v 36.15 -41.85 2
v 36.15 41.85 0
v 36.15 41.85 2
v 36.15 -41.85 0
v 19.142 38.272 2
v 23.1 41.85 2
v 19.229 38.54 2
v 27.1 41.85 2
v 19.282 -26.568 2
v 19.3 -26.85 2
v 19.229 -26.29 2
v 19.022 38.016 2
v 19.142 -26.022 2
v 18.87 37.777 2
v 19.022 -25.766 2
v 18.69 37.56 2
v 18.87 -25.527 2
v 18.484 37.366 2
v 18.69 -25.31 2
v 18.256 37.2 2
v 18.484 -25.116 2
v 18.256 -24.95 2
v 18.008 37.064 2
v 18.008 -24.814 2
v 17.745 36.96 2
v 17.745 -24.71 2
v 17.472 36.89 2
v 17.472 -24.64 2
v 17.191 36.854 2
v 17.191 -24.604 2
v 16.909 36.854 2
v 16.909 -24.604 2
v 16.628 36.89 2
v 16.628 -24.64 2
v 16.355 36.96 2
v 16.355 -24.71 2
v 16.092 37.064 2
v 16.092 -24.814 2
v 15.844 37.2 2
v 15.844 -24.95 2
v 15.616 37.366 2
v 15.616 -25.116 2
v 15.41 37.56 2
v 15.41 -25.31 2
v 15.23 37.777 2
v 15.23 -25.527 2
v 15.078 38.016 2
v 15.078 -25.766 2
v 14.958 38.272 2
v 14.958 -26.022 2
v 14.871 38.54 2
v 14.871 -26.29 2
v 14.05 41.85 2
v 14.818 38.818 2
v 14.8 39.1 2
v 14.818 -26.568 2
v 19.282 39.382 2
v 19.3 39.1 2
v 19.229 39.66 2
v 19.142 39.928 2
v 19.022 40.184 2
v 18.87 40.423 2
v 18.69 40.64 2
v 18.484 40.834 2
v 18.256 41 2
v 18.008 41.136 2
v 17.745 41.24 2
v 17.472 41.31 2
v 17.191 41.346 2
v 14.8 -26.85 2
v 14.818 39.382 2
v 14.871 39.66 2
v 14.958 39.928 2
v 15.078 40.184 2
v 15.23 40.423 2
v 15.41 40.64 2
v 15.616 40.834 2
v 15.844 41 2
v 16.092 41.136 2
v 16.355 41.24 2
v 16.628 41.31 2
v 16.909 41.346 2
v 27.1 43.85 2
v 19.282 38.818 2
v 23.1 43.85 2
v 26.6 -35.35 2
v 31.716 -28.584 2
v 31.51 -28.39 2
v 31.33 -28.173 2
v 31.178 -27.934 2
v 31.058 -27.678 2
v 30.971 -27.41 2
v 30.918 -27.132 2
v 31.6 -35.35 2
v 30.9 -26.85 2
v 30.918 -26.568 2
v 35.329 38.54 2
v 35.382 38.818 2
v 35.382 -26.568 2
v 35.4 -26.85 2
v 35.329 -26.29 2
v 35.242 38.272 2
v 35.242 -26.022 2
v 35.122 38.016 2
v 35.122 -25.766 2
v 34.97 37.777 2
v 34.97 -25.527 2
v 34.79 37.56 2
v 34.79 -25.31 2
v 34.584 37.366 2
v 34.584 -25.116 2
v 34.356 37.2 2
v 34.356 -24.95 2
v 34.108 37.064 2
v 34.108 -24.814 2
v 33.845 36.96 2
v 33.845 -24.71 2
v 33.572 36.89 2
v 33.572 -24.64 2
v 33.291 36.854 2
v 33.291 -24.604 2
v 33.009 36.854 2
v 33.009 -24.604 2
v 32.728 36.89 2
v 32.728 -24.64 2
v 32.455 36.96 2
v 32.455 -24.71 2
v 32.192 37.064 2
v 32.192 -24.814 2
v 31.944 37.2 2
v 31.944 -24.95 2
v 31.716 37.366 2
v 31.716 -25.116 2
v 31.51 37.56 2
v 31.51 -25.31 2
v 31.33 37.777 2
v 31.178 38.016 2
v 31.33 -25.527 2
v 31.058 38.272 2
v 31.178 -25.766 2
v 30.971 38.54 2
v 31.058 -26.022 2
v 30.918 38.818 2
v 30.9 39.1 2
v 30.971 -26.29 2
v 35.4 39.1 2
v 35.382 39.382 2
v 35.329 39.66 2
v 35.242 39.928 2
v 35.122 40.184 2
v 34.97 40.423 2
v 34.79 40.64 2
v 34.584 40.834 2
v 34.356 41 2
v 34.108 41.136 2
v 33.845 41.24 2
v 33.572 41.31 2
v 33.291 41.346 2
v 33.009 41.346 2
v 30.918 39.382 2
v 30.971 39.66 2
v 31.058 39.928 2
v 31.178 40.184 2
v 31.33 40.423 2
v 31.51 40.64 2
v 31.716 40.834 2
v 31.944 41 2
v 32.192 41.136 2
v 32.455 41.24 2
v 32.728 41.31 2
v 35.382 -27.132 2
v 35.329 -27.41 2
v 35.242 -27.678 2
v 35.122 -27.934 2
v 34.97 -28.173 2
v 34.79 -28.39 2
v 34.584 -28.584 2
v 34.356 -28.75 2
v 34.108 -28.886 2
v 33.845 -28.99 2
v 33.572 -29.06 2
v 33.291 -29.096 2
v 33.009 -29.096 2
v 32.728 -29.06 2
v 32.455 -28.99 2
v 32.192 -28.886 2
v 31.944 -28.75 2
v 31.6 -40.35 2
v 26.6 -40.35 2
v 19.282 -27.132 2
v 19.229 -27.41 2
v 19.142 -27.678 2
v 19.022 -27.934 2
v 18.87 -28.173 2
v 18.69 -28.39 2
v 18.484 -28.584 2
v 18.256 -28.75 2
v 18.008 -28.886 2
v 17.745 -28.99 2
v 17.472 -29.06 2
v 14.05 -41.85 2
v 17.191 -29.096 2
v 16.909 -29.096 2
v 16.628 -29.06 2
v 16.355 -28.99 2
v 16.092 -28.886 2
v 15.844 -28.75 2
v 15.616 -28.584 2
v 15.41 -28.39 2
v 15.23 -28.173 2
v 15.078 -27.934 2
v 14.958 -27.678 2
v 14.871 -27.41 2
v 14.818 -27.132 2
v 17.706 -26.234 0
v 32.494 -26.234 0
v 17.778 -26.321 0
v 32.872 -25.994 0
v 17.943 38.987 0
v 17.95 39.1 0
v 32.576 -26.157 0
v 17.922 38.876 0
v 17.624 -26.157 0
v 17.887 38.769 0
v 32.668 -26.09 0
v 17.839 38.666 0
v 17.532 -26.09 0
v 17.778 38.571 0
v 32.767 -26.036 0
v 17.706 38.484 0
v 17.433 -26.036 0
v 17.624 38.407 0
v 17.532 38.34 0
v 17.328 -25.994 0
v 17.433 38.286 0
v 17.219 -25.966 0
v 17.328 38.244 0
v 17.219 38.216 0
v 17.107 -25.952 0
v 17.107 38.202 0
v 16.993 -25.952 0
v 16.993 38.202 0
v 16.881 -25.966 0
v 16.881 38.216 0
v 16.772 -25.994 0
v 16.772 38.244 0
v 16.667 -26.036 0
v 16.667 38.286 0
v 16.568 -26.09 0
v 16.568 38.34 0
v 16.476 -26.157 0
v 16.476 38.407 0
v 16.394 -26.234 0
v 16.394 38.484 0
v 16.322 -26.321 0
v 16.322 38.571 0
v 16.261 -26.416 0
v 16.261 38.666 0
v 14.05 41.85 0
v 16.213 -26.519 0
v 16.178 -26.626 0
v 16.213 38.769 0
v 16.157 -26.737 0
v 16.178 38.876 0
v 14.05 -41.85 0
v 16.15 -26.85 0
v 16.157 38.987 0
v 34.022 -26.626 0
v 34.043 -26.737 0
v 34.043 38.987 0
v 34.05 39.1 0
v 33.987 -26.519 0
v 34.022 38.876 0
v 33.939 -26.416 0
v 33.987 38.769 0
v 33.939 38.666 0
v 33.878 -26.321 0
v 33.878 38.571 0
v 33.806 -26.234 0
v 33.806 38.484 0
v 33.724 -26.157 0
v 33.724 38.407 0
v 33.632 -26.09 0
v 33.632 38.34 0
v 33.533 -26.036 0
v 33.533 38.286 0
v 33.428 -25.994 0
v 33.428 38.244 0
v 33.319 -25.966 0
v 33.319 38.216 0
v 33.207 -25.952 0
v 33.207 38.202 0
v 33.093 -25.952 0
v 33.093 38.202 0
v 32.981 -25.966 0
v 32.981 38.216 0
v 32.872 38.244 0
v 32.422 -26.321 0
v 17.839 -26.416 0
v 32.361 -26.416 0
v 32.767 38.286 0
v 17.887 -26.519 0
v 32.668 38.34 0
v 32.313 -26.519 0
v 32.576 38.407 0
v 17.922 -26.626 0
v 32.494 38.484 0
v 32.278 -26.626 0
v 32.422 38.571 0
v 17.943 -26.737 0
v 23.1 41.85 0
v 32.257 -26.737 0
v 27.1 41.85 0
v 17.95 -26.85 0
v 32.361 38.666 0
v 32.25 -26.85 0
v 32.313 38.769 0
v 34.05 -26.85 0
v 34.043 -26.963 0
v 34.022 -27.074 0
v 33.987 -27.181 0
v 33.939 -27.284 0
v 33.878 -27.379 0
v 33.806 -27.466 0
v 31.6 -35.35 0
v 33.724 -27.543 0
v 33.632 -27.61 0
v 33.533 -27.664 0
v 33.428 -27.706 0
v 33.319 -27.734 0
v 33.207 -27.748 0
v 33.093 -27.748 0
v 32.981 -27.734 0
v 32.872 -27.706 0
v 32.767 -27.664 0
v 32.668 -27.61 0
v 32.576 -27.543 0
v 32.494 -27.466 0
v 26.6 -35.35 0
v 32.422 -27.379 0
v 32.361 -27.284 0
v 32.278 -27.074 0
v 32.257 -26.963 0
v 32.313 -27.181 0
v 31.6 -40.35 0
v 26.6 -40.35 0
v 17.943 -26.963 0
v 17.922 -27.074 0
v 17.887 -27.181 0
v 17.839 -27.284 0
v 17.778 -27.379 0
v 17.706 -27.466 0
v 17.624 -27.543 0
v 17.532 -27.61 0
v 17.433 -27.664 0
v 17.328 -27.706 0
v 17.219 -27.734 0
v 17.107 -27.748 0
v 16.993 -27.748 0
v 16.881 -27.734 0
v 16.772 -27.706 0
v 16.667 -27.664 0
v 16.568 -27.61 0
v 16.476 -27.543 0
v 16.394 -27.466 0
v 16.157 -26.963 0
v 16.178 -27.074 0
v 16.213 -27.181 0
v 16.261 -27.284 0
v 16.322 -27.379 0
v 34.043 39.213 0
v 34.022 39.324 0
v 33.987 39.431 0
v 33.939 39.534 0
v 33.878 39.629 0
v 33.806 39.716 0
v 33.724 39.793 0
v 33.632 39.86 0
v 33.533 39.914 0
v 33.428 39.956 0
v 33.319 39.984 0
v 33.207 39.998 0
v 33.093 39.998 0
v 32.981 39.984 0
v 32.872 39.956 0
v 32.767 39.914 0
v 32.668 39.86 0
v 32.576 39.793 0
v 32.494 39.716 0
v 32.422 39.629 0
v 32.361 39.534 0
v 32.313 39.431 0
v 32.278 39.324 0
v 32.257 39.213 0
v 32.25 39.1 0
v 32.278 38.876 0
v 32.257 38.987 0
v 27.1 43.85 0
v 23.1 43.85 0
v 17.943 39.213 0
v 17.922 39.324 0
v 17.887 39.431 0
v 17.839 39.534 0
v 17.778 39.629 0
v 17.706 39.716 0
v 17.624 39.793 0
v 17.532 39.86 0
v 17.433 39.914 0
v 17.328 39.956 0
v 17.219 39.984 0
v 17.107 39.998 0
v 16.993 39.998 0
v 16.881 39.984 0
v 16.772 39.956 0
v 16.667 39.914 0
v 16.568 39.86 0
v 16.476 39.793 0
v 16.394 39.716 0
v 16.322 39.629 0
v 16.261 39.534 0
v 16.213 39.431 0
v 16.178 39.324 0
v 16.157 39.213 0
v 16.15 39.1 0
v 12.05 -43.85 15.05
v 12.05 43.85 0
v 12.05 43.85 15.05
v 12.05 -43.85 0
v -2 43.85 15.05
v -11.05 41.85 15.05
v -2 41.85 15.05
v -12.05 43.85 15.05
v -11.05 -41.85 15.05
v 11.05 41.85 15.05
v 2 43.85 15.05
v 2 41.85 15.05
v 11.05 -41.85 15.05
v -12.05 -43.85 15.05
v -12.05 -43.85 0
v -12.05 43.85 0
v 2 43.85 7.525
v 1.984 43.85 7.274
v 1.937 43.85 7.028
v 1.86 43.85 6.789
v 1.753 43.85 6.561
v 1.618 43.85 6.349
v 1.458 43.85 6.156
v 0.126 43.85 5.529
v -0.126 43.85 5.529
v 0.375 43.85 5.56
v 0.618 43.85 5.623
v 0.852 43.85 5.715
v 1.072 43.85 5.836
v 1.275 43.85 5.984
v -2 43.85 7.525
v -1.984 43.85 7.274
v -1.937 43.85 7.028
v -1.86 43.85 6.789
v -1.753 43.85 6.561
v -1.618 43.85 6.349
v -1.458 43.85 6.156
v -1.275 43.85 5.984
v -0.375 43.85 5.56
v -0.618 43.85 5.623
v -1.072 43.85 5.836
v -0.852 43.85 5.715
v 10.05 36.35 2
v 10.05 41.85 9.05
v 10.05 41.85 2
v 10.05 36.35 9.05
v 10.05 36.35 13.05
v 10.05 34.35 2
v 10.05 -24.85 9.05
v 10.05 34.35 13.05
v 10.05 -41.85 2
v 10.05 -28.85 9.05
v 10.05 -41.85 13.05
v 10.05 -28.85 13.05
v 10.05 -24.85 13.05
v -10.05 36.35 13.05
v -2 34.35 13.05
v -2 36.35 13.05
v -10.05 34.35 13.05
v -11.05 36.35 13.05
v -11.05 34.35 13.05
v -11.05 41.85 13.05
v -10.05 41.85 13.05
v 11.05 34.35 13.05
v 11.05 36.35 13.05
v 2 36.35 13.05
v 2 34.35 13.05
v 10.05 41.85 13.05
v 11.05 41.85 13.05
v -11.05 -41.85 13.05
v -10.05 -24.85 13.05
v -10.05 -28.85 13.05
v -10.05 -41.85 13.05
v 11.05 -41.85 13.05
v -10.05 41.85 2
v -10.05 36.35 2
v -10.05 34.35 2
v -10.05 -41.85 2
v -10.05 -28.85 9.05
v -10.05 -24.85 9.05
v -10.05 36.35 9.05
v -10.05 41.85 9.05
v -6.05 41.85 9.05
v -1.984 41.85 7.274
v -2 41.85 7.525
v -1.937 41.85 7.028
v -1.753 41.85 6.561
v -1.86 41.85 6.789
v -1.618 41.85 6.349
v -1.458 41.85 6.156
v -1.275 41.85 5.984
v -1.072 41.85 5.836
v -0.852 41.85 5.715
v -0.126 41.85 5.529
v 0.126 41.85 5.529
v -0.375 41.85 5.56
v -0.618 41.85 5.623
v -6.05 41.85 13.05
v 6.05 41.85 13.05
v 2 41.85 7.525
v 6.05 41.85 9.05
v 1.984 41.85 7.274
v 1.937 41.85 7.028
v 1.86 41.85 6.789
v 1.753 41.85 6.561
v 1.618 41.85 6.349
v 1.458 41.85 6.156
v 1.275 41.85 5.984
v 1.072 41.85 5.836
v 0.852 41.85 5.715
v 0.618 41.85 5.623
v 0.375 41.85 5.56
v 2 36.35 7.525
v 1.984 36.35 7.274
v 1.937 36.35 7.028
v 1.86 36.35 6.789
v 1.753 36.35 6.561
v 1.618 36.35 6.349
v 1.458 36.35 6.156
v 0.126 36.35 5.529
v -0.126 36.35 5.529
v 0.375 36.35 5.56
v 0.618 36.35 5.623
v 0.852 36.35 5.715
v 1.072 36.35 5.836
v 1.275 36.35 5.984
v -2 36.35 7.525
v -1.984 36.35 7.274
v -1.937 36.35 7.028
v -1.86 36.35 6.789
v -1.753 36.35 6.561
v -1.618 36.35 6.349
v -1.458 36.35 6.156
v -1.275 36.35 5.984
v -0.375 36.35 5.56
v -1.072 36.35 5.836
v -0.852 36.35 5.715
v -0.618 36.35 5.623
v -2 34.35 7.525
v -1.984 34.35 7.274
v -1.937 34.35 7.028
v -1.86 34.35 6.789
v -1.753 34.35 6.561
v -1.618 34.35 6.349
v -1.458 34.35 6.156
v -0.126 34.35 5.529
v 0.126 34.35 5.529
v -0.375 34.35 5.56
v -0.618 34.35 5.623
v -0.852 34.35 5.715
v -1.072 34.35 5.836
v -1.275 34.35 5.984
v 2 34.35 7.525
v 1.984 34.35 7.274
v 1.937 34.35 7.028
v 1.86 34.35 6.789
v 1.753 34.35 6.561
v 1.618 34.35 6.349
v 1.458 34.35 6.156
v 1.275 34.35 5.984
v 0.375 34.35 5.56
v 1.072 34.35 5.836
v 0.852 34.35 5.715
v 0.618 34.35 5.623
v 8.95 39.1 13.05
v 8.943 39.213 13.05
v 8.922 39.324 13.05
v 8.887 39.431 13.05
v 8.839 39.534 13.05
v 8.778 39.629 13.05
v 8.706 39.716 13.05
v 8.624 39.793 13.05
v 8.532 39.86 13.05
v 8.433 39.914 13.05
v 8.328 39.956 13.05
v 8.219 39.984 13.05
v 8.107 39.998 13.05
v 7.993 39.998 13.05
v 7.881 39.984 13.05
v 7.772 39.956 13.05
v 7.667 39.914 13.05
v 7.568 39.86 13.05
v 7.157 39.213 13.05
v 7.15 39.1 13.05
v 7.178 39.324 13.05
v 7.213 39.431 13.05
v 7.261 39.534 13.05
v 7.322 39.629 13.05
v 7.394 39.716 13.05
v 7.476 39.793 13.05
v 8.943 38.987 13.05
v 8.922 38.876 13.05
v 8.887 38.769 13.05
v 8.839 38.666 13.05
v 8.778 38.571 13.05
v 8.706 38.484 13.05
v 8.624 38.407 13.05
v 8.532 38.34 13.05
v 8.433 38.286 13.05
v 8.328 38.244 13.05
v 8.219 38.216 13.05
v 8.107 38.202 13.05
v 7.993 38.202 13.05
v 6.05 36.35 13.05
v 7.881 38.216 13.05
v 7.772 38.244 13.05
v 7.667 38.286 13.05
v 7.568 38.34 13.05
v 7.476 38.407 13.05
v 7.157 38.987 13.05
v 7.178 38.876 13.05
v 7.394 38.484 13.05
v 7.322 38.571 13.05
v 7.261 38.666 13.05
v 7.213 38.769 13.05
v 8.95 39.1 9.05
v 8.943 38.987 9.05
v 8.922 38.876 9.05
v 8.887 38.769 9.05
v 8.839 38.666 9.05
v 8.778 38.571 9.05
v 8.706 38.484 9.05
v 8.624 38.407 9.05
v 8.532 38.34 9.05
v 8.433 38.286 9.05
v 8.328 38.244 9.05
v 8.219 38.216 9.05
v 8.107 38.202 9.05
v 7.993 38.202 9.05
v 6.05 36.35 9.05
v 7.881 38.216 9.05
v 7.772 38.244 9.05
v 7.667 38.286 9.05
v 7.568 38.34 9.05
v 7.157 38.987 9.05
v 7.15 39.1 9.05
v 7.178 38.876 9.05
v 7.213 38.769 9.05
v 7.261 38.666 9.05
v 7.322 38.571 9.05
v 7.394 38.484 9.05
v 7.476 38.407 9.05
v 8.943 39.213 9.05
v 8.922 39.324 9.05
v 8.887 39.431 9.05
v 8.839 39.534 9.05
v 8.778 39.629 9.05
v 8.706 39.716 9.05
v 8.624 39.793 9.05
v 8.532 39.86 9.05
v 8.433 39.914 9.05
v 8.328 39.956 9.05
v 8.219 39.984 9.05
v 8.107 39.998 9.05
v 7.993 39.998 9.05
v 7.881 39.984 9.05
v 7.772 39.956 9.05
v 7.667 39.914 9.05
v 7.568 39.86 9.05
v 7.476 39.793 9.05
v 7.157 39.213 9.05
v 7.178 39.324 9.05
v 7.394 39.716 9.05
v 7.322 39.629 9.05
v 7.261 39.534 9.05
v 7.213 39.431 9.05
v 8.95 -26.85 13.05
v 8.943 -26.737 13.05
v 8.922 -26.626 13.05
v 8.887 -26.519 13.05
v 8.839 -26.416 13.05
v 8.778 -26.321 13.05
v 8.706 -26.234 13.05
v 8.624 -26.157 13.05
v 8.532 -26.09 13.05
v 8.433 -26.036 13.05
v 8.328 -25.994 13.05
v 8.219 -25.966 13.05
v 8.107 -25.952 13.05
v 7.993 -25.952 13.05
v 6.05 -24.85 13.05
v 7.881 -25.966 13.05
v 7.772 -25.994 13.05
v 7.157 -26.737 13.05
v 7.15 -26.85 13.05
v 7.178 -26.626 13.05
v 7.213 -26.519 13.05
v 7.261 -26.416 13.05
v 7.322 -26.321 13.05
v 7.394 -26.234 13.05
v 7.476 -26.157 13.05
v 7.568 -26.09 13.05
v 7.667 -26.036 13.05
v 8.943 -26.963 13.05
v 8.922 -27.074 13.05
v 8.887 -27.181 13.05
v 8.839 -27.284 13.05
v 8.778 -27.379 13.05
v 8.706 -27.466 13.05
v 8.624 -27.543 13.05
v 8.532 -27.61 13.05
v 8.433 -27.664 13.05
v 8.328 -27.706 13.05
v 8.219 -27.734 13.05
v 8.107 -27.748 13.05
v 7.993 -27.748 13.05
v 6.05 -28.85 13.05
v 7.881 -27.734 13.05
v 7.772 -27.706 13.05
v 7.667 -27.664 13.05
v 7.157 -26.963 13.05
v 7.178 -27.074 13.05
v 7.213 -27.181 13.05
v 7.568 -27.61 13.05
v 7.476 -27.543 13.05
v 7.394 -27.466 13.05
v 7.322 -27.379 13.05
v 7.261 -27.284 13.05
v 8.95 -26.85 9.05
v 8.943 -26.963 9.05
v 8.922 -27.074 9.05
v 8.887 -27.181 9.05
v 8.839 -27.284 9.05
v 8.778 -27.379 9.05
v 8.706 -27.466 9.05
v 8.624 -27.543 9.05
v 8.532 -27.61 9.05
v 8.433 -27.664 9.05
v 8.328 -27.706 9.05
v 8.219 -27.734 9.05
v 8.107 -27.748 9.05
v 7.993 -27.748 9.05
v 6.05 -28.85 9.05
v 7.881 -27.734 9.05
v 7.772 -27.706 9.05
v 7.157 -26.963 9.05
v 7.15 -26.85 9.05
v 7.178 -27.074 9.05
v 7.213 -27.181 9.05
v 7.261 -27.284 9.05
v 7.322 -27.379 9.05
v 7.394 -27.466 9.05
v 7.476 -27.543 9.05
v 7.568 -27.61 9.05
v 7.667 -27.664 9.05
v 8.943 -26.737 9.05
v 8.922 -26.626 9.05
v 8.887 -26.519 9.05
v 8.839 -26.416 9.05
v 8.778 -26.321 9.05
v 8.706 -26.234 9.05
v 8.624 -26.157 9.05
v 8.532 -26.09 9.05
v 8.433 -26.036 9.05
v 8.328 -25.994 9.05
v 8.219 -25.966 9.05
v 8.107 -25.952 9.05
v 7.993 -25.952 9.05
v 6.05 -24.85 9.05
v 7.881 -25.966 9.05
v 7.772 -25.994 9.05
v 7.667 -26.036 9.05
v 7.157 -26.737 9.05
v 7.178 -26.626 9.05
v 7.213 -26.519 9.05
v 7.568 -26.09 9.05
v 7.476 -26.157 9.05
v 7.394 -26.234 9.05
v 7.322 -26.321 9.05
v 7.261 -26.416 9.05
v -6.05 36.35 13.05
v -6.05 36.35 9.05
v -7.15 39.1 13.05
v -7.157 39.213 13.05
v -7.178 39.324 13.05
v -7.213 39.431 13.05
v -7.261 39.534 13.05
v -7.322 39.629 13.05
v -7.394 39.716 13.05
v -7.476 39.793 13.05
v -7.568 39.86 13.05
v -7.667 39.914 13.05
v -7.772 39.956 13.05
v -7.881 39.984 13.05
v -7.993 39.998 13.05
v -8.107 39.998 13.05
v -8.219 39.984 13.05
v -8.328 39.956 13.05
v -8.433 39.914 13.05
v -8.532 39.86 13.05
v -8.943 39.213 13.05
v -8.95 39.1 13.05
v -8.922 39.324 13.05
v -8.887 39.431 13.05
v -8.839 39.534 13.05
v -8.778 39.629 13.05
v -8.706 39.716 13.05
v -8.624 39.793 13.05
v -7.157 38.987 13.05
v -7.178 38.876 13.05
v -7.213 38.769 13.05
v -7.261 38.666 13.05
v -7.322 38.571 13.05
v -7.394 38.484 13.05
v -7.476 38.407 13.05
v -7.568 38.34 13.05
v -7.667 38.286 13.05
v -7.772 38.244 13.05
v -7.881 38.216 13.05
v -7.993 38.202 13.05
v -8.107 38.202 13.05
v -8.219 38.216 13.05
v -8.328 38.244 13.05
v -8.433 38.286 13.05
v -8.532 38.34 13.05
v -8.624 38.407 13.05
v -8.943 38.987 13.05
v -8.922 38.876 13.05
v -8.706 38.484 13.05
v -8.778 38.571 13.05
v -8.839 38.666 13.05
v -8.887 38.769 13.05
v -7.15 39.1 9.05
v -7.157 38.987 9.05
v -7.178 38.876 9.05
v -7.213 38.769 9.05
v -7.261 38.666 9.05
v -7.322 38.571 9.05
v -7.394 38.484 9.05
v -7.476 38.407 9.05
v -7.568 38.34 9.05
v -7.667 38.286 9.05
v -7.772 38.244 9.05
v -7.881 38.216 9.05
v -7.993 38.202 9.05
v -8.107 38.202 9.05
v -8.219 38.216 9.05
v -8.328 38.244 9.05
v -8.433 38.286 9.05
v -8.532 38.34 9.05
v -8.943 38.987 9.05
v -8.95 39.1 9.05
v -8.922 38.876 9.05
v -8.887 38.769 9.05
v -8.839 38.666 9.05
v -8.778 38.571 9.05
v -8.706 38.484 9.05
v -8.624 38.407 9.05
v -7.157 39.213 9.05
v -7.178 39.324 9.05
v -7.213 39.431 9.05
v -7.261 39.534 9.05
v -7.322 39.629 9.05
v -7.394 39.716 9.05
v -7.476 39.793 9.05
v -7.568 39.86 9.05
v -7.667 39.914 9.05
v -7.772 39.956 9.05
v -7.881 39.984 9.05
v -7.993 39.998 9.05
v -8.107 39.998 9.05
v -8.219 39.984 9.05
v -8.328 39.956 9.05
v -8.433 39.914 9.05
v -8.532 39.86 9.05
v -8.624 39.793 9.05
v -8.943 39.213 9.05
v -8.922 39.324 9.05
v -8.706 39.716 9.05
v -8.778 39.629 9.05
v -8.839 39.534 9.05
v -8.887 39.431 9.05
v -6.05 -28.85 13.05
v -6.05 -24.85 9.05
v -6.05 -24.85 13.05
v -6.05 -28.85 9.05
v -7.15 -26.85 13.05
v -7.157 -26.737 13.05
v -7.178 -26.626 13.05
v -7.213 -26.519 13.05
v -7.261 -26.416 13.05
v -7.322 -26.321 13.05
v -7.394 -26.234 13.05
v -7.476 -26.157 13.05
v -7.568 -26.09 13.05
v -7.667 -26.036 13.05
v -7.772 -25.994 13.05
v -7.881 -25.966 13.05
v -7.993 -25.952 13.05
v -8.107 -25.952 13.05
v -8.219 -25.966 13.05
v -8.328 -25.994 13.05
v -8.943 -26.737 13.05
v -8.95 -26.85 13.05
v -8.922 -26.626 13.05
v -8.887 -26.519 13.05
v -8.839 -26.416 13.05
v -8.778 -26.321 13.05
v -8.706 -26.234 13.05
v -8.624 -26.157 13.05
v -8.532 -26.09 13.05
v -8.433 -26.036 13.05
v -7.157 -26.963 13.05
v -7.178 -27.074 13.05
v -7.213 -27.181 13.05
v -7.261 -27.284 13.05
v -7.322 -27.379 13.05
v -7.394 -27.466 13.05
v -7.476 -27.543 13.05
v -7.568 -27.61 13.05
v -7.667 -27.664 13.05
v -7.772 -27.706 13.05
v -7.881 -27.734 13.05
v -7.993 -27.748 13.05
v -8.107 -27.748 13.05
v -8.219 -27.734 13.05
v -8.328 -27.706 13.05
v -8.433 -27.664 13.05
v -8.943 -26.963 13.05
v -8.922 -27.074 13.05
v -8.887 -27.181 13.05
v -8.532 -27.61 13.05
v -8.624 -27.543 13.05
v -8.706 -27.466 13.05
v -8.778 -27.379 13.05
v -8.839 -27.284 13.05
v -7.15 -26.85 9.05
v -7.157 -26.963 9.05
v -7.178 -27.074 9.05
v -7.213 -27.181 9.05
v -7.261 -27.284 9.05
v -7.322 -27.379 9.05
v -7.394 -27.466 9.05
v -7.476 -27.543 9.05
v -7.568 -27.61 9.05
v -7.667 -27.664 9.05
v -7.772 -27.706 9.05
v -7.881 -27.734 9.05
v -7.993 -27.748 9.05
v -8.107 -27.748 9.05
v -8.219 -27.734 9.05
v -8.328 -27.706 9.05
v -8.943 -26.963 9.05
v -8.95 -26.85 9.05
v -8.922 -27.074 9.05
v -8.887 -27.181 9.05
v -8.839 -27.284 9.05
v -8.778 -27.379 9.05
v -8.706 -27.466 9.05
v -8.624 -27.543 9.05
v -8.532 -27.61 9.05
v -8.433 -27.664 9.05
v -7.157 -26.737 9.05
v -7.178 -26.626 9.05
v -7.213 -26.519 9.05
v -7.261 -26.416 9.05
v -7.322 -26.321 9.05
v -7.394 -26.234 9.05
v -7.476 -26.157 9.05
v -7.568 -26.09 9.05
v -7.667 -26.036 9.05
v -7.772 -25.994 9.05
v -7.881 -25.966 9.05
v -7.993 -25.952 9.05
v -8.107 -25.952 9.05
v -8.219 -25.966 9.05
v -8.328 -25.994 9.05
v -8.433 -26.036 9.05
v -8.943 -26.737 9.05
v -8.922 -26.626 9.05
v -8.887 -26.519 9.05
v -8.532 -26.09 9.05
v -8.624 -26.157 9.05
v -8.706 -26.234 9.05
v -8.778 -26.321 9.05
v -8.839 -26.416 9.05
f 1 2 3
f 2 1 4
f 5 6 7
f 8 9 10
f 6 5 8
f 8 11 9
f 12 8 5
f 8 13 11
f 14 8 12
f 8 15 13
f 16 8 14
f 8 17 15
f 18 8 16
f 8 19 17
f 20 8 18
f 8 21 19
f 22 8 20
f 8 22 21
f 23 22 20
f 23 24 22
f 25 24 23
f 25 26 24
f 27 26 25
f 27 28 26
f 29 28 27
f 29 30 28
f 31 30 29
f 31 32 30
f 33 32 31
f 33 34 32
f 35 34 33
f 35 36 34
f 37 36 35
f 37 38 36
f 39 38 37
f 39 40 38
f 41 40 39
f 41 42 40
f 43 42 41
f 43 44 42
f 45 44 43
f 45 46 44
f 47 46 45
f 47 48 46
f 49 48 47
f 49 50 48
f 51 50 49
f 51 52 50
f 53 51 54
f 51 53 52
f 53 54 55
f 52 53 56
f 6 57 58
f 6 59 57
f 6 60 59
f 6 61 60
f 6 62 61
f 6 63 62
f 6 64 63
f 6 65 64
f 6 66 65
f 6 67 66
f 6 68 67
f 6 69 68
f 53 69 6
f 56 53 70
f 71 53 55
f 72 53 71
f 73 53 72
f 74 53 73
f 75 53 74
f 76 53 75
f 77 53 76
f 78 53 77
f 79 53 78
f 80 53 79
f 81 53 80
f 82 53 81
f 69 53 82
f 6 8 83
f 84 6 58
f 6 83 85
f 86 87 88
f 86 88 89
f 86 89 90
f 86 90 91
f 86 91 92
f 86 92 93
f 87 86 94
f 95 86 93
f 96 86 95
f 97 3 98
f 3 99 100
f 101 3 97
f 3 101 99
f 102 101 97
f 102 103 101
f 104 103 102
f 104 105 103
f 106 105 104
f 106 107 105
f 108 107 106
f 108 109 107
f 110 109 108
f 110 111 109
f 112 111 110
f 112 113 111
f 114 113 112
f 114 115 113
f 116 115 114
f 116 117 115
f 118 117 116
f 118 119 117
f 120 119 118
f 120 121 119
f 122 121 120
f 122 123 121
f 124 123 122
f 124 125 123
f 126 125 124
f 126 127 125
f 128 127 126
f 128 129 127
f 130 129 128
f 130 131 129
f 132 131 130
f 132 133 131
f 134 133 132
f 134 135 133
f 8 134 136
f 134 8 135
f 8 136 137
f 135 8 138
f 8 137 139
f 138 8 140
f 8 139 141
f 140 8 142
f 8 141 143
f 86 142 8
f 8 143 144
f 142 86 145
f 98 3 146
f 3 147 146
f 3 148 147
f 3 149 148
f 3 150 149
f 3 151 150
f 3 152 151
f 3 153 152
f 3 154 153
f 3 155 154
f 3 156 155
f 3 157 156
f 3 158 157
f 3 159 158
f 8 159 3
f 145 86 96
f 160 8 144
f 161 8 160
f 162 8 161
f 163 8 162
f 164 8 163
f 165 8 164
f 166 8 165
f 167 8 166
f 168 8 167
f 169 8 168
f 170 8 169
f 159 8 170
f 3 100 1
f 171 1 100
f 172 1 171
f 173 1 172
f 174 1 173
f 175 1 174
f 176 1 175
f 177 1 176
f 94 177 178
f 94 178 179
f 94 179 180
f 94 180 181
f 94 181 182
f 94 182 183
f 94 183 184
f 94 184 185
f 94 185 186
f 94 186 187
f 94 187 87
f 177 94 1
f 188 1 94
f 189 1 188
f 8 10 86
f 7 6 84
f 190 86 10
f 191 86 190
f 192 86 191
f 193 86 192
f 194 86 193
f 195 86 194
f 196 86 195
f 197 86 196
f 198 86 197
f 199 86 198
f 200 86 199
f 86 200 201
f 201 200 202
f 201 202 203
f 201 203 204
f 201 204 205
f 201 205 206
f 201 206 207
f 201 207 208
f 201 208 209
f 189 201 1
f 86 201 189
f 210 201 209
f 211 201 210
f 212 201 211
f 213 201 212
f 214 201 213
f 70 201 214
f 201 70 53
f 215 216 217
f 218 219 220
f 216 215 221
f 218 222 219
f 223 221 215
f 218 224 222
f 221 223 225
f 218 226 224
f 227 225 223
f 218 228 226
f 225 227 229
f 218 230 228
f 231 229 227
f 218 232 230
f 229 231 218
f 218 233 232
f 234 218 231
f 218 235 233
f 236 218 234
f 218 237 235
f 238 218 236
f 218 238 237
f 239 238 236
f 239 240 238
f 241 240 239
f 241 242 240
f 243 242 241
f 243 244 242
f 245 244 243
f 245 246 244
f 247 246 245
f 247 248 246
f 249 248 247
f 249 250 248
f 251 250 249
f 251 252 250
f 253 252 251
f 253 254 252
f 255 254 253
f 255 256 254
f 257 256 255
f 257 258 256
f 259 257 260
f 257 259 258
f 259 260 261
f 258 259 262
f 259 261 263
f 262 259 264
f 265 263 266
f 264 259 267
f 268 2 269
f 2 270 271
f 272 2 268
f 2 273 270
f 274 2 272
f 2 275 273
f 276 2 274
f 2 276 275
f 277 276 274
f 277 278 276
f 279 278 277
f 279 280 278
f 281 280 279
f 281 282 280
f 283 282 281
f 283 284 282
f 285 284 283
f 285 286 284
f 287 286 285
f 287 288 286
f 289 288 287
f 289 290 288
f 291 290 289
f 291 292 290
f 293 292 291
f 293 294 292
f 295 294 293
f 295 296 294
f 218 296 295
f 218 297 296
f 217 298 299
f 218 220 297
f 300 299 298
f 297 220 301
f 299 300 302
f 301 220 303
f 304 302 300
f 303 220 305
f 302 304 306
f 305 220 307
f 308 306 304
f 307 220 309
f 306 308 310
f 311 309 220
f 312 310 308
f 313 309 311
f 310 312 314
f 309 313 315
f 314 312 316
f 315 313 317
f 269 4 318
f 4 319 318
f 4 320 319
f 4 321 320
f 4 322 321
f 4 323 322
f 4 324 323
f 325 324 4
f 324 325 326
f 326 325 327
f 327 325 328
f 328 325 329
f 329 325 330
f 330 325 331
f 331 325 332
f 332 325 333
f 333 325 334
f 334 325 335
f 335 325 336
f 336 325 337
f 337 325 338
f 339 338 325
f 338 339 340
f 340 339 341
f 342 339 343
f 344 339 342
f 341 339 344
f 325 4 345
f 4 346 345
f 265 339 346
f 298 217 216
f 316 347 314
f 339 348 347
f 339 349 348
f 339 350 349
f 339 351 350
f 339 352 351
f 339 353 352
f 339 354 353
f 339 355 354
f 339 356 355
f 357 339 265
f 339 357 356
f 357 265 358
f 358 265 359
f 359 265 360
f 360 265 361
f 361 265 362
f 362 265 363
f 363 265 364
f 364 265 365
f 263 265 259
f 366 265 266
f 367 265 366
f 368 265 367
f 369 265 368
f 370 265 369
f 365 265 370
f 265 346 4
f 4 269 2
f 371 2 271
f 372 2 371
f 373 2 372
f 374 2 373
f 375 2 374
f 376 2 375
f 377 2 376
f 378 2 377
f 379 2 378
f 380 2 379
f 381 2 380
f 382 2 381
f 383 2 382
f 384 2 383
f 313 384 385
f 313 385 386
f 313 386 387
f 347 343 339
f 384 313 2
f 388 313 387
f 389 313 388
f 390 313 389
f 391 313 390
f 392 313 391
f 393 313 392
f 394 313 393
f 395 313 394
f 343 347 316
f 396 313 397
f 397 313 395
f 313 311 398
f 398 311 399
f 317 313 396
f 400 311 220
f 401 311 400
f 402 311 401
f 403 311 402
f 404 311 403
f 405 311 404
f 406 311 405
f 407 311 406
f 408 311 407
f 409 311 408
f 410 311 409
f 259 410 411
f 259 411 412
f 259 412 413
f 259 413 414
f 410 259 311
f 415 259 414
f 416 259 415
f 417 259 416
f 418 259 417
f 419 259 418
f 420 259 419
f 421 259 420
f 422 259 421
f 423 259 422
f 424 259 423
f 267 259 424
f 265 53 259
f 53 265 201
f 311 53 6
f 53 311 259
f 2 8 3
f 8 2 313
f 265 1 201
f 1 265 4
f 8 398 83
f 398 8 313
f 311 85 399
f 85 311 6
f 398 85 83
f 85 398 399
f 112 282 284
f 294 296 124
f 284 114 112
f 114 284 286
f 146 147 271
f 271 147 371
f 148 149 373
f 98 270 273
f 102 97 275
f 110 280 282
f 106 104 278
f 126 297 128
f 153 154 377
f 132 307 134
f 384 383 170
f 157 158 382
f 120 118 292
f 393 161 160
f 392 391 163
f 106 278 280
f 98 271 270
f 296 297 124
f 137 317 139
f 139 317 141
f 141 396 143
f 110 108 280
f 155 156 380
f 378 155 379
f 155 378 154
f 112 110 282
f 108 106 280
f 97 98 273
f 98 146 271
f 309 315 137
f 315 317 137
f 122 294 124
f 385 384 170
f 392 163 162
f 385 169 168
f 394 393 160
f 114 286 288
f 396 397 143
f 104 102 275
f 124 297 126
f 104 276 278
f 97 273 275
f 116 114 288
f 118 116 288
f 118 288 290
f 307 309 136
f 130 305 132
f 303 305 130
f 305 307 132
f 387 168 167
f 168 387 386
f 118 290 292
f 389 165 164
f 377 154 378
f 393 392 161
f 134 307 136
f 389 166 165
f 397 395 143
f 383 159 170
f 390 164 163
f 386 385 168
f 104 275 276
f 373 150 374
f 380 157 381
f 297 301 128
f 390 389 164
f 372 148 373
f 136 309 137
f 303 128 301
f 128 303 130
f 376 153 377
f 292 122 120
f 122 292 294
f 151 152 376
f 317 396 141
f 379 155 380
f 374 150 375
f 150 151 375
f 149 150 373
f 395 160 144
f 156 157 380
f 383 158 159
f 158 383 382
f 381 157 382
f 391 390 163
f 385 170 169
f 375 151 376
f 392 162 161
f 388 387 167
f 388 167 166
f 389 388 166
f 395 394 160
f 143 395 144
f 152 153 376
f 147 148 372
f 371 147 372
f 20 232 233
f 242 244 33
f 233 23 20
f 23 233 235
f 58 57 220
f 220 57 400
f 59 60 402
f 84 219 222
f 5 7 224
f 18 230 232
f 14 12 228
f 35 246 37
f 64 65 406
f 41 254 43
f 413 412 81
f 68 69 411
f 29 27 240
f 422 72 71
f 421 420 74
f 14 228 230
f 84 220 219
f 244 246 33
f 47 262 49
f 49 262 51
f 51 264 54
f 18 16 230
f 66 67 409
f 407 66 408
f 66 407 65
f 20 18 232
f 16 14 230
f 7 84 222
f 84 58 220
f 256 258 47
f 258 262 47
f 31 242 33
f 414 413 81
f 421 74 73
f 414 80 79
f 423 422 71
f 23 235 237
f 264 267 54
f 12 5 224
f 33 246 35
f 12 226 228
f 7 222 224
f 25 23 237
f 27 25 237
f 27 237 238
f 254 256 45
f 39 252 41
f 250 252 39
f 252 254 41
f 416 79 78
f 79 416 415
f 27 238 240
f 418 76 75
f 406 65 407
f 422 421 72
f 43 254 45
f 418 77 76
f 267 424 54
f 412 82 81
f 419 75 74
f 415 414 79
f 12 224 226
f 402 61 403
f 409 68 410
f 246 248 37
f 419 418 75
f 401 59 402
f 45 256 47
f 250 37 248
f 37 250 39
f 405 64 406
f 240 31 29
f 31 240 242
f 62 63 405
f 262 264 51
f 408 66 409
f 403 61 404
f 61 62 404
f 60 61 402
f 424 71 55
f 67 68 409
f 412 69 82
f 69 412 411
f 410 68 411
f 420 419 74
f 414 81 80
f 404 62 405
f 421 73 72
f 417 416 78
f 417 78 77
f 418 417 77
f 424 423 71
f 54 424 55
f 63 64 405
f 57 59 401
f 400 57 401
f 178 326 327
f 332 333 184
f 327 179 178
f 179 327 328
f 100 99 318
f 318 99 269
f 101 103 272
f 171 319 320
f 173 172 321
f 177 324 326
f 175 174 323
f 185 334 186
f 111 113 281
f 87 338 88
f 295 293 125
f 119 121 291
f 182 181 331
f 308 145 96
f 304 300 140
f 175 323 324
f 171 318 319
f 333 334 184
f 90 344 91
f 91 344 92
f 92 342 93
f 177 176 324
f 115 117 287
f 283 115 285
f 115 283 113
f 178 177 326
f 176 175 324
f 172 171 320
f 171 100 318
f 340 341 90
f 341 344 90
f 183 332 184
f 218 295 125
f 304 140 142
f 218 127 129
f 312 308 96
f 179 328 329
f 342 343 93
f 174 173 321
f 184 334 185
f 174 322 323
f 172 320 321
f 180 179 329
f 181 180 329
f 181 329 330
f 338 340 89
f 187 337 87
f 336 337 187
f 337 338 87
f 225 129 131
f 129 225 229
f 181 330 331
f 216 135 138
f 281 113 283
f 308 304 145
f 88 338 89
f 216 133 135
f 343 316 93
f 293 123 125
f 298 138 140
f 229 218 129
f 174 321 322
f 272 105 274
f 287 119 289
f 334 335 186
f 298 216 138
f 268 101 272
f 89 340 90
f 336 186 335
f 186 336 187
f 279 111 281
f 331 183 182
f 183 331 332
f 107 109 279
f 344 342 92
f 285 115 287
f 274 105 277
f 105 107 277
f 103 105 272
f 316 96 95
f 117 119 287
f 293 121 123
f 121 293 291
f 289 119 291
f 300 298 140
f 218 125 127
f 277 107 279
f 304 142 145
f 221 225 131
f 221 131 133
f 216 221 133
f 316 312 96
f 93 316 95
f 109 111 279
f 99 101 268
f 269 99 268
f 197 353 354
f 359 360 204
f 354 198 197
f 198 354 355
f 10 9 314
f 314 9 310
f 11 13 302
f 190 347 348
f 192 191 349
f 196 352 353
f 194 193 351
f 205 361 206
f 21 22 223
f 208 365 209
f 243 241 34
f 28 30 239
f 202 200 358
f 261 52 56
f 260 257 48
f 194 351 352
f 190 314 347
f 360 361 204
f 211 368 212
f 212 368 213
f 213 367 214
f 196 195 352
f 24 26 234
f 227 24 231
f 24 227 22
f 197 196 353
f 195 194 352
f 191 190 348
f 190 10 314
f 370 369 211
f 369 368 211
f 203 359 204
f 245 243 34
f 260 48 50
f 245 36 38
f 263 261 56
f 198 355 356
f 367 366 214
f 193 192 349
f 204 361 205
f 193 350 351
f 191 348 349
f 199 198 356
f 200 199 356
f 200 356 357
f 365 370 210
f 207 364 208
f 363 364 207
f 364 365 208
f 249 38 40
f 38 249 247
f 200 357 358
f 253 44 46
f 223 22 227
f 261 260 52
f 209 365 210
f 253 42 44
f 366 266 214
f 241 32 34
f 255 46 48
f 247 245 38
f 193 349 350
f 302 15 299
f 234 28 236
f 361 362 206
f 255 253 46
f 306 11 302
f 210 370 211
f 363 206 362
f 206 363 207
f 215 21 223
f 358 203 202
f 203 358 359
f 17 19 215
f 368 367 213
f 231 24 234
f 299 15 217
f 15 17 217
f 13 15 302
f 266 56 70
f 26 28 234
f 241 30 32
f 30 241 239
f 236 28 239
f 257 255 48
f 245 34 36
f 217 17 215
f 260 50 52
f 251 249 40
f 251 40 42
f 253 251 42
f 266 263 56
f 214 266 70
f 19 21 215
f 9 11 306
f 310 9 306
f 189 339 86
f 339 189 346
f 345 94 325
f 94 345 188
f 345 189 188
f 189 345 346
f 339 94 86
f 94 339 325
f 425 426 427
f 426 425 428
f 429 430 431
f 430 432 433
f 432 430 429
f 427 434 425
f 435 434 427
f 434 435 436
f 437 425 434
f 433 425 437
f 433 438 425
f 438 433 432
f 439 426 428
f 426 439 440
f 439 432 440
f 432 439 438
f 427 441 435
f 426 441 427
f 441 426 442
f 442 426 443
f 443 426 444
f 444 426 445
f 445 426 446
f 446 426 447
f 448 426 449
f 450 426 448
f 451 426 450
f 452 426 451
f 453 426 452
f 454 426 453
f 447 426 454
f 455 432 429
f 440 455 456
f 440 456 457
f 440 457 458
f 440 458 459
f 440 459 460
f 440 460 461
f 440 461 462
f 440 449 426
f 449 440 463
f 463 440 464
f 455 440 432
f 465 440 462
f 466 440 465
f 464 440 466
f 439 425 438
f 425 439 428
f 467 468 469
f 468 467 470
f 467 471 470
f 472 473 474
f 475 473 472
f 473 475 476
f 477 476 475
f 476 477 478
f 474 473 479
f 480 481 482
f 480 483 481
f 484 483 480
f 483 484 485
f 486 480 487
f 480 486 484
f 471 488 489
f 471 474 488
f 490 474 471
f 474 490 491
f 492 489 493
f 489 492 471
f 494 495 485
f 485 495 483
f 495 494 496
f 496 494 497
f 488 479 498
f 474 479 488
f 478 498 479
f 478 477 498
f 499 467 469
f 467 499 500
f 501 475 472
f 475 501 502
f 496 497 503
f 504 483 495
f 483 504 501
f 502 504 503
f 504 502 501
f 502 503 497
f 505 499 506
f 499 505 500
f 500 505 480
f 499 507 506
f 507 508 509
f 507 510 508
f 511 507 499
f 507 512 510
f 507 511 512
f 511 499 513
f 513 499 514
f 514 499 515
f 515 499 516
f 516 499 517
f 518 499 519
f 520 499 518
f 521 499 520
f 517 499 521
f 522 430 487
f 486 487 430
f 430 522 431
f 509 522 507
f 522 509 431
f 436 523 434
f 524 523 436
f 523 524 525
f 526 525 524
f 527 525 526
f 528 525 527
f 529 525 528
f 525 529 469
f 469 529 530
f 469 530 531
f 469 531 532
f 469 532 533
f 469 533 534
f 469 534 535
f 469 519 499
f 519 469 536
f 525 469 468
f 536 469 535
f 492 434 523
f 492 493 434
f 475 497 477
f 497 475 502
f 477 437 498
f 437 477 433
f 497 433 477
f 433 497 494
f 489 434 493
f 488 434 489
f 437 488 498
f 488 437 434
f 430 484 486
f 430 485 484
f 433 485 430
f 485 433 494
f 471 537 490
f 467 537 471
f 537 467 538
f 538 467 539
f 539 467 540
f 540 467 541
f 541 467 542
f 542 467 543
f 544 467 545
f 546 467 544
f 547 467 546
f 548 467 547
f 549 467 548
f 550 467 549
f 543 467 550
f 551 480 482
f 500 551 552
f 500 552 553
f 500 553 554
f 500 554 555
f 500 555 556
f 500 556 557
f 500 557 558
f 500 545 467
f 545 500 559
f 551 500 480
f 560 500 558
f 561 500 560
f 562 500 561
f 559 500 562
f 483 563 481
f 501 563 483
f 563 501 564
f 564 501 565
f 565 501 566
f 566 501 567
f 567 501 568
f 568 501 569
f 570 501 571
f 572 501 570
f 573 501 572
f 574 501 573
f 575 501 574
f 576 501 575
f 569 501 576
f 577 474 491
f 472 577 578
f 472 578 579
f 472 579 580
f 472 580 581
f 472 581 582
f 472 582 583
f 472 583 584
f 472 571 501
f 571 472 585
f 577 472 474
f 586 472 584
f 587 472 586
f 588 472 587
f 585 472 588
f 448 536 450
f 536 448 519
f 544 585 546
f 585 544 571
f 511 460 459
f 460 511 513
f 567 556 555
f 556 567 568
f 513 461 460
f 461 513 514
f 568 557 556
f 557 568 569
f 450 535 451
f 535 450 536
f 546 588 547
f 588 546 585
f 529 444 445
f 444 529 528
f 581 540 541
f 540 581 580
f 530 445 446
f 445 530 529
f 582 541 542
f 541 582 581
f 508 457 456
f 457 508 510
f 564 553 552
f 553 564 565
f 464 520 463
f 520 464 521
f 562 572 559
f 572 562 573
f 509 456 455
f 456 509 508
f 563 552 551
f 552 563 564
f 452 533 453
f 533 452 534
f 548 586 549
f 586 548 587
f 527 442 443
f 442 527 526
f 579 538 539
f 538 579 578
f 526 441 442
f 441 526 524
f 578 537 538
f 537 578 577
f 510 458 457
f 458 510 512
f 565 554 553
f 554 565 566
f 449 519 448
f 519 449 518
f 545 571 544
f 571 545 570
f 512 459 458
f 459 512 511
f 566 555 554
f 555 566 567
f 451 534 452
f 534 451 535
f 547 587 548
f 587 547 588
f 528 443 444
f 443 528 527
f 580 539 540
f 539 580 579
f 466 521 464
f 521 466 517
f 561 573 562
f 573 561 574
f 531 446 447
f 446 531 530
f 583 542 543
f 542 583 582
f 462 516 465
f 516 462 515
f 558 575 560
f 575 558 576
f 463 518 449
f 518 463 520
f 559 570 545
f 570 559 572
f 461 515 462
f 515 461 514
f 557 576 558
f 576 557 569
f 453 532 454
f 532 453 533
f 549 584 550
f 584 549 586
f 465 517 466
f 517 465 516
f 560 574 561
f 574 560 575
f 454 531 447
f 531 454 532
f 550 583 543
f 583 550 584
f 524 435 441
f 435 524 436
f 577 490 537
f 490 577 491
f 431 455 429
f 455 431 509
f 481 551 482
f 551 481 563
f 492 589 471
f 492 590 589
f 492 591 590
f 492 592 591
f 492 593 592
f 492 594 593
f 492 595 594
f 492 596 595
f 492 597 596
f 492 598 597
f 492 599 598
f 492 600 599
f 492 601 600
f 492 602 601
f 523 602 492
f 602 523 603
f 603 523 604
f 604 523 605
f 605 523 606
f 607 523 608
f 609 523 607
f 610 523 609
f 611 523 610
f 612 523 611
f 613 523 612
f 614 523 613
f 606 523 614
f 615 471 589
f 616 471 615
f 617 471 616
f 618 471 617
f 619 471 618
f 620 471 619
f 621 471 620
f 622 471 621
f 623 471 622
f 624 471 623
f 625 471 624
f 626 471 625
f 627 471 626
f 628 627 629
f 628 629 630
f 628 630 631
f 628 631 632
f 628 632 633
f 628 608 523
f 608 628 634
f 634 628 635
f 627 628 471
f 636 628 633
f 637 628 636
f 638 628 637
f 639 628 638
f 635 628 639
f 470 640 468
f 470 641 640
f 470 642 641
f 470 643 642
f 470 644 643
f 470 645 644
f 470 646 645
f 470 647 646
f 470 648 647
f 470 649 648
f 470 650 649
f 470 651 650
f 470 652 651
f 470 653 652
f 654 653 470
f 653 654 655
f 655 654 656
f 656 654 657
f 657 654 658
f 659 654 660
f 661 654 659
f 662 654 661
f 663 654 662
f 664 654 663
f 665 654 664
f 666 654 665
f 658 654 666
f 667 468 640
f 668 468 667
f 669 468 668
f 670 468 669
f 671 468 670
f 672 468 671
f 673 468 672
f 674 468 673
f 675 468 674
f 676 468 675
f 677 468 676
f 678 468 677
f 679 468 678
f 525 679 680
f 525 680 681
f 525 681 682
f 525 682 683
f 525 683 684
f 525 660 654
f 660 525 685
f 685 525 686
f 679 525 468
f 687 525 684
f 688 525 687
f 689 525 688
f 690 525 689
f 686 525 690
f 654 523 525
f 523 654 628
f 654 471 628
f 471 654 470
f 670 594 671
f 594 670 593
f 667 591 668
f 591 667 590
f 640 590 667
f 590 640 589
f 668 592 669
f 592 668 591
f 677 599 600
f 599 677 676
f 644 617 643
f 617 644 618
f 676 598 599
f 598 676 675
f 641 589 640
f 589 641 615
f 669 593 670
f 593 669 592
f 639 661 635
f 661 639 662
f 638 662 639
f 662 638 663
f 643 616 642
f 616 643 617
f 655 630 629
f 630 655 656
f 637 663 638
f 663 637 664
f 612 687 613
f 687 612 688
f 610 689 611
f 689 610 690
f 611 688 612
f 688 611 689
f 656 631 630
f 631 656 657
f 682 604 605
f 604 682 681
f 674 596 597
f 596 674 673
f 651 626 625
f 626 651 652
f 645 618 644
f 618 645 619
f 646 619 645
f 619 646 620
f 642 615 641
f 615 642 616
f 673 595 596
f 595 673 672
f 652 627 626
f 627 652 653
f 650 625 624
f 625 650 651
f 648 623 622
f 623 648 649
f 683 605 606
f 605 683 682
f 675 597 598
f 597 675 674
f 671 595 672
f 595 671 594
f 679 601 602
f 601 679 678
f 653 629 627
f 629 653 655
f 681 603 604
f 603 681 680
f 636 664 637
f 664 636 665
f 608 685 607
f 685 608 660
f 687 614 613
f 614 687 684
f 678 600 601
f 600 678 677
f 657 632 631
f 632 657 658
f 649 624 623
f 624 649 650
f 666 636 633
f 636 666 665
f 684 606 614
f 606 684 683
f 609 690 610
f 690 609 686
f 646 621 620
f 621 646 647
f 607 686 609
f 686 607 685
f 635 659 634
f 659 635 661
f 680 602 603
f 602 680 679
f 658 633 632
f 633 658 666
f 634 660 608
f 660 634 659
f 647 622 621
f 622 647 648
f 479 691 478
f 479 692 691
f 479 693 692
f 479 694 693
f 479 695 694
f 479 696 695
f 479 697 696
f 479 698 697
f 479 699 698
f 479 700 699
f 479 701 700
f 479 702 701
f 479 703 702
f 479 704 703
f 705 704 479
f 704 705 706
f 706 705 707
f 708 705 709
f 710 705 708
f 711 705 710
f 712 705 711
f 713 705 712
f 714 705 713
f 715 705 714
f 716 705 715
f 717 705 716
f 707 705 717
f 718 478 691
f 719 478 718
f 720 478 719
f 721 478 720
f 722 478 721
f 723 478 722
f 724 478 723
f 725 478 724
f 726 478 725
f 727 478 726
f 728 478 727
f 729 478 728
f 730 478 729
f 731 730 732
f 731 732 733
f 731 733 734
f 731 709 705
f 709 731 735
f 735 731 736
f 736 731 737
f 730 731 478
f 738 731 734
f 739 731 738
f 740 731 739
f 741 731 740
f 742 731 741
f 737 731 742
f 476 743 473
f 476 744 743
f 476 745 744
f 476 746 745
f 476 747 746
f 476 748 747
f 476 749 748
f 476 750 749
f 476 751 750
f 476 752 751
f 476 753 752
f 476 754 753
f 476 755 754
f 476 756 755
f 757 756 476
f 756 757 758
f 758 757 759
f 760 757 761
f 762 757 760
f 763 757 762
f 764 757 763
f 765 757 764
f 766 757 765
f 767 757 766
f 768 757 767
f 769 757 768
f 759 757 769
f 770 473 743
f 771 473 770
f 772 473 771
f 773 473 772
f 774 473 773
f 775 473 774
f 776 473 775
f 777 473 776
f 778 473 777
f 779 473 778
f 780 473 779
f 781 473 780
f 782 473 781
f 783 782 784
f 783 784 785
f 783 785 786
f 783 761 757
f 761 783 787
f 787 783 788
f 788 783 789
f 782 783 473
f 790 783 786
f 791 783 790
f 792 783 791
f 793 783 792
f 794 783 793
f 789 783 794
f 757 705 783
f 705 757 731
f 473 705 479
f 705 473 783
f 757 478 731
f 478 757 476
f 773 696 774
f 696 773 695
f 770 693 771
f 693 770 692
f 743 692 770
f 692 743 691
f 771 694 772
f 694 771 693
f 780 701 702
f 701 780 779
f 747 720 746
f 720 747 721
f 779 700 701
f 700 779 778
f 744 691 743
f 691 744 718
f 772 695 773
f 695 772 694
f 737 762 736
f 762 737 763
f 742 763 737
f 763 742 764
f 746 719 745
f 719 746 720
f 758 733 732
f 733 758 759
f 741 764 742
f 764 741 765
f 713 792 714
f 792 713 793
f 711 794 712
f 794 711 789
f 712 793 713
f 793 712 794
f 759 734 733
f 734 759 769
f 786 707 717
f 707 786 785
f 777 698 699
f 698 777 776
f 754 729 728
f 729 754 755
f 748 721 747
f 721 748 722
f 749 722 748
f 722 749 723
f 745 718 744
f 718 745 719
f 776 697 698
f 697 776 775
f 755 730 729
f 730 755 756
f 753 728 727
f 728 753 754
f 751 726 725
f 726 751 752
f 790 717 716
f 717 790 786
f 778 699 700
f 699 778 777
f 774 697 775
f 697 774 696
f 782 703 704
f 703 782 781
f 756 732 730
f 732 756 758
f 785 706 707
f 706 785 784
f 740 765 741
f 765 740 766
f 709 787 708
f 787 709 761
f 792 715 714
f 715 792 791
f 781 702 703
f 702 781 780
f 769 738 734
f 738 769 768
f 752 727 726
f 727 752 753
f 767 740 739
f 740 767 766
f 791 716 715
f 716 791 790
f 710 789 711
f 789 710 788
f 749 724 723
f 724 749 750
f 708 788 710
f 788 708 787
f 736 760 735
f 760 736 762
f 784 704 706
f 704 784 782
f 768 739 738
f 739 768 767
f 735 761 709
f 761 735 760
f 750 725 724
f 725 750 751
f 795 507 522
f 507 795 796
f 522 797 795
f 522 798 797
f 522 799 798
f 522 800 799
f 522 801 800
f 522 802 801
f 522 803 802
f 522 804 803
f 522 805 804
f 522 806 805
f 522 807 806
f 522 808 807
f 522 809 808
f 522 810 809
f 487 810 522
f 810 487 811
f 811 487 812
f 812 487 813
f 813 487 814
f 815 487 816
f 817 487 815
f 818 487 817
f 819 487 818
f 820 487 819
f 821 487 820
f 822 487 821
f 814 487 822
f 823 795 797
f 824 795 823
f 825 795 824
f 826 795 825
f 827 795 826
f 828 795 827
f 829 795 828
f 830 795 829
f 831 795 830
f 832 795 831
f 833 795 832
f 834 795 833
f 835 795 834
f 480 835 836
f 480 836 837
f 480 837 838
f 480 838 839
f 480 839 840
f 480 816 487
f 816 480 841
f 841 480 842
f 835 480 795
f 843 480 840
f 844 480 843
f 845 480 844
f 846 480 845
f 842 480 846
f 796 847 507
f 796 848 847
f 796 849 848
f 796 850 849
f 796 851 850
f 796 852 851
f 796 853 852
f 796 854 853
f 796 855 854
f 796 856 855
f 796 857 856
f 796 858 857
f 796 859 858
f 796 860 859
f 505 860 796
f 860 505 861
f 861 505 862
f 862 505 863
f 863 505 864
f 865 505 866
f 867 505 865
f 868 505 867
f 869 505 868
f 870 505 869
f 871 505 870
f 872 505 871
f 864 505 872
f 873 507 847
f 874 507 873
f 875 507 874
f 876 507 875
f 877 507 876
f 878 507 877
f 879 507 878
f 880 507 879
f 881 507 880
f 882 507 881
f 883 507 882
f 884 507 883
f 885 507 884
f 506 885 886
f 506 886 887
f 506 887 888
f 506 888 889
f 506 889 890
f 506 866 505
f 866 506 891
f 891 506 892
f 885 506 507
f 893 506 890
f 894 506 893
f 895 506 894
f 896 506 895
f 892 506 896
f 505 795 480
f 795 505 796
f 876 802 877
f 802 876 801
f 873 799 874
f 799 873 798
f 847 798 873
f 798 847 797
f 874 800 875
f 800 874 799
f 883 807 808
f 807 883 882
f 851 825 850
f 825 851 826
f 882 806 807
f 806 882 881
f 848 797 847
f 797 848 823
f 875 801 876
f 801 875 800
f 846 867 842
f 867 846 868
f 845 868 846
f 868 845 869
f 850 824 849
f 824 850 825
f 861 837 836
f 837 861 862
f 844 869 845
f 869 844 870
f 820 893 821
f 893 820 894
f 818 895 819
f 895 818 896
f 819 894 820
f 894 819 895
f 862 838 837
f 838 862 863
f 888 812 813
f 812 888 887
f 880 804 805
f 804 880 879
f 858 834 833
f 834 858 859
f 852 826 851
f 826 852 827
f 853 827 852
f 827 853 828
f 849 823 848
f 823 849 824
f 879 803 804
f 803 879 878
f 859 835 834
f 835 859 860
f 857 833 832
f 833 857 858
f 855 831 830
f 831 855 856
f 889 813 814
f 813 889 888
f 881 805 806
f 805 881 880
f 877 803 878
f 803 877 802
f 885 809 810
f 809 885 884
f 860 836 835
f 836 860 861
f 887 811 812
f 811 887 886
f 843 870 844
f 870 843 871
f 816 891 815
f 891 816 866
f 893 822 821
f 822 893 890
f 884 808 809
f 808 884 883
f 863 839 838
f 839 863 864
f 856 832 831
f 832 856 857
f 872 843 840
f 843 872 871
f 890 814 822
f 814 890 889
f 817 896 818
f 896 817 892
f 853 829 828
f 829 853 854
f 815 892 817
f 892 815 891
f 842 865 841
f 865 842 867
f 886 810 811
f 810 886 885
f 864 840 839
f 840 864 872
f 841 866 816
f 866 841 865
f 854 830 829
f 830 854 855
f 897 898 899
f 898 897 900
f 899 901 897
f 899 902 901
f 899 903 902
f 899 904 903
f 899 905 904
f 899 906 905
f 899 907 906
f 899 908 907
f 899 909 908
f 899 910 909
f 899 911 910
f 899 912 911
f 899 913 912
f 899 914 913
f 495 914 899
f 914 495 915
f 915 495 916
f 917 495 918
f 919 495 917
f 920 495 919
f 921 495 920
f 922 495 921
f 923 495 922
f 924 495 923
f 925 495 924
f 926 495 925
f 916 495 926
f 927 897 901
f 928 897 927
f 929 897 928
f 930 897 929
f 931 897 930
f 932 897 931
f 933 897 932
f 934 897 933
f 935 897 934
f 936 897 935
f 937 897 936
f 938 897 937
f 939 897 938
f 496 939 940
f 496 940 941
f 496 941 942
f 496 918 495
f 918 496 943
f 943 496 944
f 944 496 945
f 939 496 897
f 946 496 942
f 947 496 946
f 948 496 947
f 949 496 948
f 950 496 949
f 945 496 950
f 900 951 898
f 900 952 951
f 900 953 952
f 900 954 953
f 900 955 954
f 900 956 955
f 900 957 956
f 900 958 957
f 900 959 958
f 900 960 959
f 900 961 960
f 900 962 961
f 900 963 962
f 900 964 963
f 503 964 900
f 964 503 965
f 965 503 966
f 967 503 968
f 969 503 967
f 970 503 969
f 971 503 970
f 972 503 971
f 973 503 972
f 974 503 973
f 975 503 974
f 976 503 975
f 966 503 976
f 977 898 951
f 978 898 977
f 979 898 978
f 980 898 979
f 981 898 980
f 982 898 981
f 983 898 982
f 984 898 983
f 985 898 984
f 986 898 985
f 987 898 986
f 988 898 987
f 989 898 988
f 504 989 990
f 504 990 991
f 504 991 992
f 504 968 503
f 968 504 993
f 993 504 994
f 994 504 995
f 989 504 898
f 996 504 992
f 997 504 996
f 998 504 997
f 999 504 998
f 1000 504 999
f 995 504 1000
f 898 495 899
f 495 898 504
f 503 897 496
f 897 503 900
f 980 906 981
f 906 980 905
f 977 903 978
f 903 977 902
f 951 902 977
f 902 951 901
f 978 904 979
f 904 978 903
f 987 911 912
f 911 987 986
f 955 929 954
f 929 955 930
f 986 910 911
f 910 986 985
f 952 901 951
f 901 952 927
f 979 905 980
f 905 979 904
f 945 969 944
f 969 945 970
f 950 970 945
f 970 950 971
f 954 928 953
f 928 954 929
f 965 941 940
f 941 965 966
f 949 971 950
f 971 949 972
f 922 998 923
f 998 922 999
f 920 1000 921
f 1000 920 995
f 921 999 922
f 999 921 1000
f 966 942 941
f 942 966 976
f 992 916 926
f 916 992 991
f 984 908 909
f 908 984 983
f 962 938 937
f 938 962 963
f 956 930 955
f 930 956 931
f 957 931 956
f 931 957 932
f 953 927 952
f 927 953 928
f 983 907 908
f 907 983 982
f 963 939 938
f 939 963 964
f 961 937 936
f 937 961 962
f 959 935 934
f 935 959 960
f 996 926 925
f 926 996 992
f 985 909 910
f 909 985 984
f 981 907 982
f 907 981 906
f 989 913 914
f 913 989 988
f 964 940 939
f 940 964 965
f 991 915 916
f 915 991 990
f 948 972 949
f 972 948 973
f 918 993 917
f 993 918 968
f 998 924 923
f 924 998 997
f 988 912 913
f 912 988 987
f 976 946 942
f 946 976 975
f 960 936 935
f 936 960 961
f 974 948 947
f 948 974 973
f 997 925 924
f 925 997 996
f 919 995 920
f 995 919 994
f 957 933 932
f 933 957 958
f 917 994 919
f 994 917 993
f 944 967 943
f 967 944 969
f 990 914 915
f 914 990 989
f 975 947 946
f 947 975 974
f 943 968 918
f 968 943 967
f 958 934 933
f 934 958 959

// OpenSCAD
$fn = 50 ;
e=2;

// diametre vis
vis_d = 1.8 ;
vis_l = 3 ;
vis_tete_d = 4.5 ;
vis_tete_l=2 ;

cable_d = 3.5 ;
cable_usb_d = 4 ;

teensy_40_x = 18.1 ; // 17.78 ;
teensy_40_y = 35.7 ; // 35.56 ;
teensy_40_e = 1.8 ; // 1.57 ;

usb_x = 12 ;
usb_y = 40 ;
usb_z = 7 ;
usb_dz = 2.5/2+ teensy_40_e ;

teensy_40_z = max(3.07 + teensy_40_e , usb_dz + usb_z / 2 );

teensy_40_led_dx = -4 ;
teensy_40_led_dy = teensy_40_y / 2 - 4 ;
teensy_40_led_x = 5 ;
teensy_40_led_y = 5 ;

serre_l = 3.5 ;
serre_e = 1.25 ;
serre_tete_e = 5.5 ;

evidement_y = serre_l+vis_tete_d + usb_y ;

// boitier
boitier_x = teensy_40_x + e ;
boitier_y = teensy_40_y  + evidement_y ;
boitier_z = cable_d + 1 + teensy_40_z ;
echo("boitier_z=",boitier_z);
teensy_40_dy = -(boitier_y - teensy_40_y)/2 ;
teensy_40_dz = -3 ;

couvercle_x = boitier_x + e ;

cale_e = e + vis_d ;
fermeture_d=1 ;
patte_dy = 15;

module vis()
{
    translate([0,0,-vis_tete_l/2])
        cylinder(d1=vis_d,d2=vis_tete_d,h=vis_tete_l,center=true);
    translate([0,0,-vis_l/2-vis_tete_l])
        cylinder(d=vis_d,h=vis_l,center=true);
}
module teensy_40()
{
    // Plaque
    translate([0,0,teensy_40_e/2])
        cube([teensy_40_x, teensy_40_y, teensy_40_e],center = true );
     //USB
    translate([0,-teensy_40_y/2 - usb_y / 2 + e , usb_dz])
        cube([usb_x,usb_y, usb_z],center = true );
    // led
    translate([teensy_40_led_dx,teensy_40_led_dy,(teensy_40_z + e)/ 2 + teensy_40_e])
        cube([teensy_40_led_x,teensy_40_led_y, teensy_40_z + e ],center = true );
}
module patte(ee)
{
    difference()
    {
        cube([2*e,ee,2*e],center=true);
        cylinder(d=vis_d,h=10,center=true);
    }

}
module boitier()
{
    difference()
    {
        union()
        {
            difference()
            {
                // boitier
                cube([boitier_x+2*e, boitier_y + 2*e, boitier_z + 2*e],center= true);
                // evidement
                cube([boitier_x, boitier_y , boitier_z ],center= true);
                // moins couvercle
                translate([0,0,boitier_z/2 +e/2])
                    cube([couvercle_x ,boitier_y, e ],center= true);
                // moins teensy
                *translate([0,teensy_40_dy,teensy_40_dz])
                    rotate([0,0,180])
                        teensy_40();
            }
            // serrcable
            translate([0,boitier_y/2 -e/2 - serre_tete_e,0])
                cube([couvercle_x , e , boitier_z ],center= true);
        }
        // trou cables
        translate([0 ,boitier_y / 2 ,0 ])
            rotate([90,0,0])
                cylinder(d=cable_usb_d,h=50,center=true);
        translate([0 ,boitier_y / 2 , boitier_z / 4 + e/2 ])
            cube([cable_usb_d,50,boitier_z/2+e],center=true);
    }
    // patte vis 
    translate([boitier_x/2-e,boitier_y/2 -serre_tete_e/2 ,boitier_z/2 -e])
        patte(serre_tete_e) ;
    translate([boitier_x/2-e,-boitier_y/2 + patte_dy ,boitier_z/2 -e])
        patte(2*e) ;
    translate([-boitier_x/2+e,boitier_y/2 -serre_tete_e/2 ,boitier_z/2 -e])
        patte(serre_tete_e) ;
    translate([-boitier_x/2+e,-boitier_y/2 + patte_dy ,boitier_z/2 -e])
        patte(2*e) ;

}

module couvercle()
{
    translate([0,0 ,boitier_z/2 +e/2])
    difference()
    {
        union()
        {
            // couvercle
            cube([boitier_x+e,boitier_y,e],center=true);
            translate([0,boitier_y/2 + e/2,0])
                cube([cable_usb_d,e,e],center=true);
        }
        // trou-vis
        translate([boitier_x/2-e,boitier_y/2 -serre_tete_e/2 ,e/2])
                vis();
        translate([-boitier_x/2+e,boitier_y/2 -serre_tete_e/2 ,e/2])
                vis();
        translate([boitier_x/2-e,-boitier_y/2 +patte_dy ,e/2])
                vis();
        translate([-boitier_x/2+e,-boitier_y/2 +patte_dy ,e/2])
                vis();
        // moins teensy
        translate([0,teensy_40_dy,-8])
            rotate([0,0,180])
                teensy_40();
    }

}
*vis();
*teensy_40();
*difference()
{
    union()
    {
        boitier();
        translate([0,teensy_40_dy,teensy_40_dz])
            rotate([0,0,180])
            teensy_40() ;
    }
    *translate([0,0,105])
        cube([200,200,200],center = true );
}
*translate([0,0,5])
    couvercle();
translate([boitier_x + 5 ,0,-boitier_z/2 ]) couvercle();
translate([0 ,0,boitier_z/2 + e ]) boitier() ;
